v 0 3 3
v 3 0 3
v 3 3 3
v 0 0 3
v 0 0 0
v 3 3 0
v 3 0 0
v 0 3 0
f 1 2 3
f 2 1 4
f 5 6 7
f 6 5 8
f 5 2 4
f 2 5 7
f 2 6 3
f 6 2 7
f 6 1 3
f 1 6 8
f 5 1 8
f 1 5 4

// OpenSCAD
// ALPHA ZERO IS STILL GEOMETRY. Verified at the binary: `color("red", 0) cube(3);`
// exports 12 facets, the same as a bare cube. Alpha is appearance, so there is no
// "invisible therefore absent" case for a pass-through to wrongly resurrect.
color("red", 0) cube([3, 3, 3]);
